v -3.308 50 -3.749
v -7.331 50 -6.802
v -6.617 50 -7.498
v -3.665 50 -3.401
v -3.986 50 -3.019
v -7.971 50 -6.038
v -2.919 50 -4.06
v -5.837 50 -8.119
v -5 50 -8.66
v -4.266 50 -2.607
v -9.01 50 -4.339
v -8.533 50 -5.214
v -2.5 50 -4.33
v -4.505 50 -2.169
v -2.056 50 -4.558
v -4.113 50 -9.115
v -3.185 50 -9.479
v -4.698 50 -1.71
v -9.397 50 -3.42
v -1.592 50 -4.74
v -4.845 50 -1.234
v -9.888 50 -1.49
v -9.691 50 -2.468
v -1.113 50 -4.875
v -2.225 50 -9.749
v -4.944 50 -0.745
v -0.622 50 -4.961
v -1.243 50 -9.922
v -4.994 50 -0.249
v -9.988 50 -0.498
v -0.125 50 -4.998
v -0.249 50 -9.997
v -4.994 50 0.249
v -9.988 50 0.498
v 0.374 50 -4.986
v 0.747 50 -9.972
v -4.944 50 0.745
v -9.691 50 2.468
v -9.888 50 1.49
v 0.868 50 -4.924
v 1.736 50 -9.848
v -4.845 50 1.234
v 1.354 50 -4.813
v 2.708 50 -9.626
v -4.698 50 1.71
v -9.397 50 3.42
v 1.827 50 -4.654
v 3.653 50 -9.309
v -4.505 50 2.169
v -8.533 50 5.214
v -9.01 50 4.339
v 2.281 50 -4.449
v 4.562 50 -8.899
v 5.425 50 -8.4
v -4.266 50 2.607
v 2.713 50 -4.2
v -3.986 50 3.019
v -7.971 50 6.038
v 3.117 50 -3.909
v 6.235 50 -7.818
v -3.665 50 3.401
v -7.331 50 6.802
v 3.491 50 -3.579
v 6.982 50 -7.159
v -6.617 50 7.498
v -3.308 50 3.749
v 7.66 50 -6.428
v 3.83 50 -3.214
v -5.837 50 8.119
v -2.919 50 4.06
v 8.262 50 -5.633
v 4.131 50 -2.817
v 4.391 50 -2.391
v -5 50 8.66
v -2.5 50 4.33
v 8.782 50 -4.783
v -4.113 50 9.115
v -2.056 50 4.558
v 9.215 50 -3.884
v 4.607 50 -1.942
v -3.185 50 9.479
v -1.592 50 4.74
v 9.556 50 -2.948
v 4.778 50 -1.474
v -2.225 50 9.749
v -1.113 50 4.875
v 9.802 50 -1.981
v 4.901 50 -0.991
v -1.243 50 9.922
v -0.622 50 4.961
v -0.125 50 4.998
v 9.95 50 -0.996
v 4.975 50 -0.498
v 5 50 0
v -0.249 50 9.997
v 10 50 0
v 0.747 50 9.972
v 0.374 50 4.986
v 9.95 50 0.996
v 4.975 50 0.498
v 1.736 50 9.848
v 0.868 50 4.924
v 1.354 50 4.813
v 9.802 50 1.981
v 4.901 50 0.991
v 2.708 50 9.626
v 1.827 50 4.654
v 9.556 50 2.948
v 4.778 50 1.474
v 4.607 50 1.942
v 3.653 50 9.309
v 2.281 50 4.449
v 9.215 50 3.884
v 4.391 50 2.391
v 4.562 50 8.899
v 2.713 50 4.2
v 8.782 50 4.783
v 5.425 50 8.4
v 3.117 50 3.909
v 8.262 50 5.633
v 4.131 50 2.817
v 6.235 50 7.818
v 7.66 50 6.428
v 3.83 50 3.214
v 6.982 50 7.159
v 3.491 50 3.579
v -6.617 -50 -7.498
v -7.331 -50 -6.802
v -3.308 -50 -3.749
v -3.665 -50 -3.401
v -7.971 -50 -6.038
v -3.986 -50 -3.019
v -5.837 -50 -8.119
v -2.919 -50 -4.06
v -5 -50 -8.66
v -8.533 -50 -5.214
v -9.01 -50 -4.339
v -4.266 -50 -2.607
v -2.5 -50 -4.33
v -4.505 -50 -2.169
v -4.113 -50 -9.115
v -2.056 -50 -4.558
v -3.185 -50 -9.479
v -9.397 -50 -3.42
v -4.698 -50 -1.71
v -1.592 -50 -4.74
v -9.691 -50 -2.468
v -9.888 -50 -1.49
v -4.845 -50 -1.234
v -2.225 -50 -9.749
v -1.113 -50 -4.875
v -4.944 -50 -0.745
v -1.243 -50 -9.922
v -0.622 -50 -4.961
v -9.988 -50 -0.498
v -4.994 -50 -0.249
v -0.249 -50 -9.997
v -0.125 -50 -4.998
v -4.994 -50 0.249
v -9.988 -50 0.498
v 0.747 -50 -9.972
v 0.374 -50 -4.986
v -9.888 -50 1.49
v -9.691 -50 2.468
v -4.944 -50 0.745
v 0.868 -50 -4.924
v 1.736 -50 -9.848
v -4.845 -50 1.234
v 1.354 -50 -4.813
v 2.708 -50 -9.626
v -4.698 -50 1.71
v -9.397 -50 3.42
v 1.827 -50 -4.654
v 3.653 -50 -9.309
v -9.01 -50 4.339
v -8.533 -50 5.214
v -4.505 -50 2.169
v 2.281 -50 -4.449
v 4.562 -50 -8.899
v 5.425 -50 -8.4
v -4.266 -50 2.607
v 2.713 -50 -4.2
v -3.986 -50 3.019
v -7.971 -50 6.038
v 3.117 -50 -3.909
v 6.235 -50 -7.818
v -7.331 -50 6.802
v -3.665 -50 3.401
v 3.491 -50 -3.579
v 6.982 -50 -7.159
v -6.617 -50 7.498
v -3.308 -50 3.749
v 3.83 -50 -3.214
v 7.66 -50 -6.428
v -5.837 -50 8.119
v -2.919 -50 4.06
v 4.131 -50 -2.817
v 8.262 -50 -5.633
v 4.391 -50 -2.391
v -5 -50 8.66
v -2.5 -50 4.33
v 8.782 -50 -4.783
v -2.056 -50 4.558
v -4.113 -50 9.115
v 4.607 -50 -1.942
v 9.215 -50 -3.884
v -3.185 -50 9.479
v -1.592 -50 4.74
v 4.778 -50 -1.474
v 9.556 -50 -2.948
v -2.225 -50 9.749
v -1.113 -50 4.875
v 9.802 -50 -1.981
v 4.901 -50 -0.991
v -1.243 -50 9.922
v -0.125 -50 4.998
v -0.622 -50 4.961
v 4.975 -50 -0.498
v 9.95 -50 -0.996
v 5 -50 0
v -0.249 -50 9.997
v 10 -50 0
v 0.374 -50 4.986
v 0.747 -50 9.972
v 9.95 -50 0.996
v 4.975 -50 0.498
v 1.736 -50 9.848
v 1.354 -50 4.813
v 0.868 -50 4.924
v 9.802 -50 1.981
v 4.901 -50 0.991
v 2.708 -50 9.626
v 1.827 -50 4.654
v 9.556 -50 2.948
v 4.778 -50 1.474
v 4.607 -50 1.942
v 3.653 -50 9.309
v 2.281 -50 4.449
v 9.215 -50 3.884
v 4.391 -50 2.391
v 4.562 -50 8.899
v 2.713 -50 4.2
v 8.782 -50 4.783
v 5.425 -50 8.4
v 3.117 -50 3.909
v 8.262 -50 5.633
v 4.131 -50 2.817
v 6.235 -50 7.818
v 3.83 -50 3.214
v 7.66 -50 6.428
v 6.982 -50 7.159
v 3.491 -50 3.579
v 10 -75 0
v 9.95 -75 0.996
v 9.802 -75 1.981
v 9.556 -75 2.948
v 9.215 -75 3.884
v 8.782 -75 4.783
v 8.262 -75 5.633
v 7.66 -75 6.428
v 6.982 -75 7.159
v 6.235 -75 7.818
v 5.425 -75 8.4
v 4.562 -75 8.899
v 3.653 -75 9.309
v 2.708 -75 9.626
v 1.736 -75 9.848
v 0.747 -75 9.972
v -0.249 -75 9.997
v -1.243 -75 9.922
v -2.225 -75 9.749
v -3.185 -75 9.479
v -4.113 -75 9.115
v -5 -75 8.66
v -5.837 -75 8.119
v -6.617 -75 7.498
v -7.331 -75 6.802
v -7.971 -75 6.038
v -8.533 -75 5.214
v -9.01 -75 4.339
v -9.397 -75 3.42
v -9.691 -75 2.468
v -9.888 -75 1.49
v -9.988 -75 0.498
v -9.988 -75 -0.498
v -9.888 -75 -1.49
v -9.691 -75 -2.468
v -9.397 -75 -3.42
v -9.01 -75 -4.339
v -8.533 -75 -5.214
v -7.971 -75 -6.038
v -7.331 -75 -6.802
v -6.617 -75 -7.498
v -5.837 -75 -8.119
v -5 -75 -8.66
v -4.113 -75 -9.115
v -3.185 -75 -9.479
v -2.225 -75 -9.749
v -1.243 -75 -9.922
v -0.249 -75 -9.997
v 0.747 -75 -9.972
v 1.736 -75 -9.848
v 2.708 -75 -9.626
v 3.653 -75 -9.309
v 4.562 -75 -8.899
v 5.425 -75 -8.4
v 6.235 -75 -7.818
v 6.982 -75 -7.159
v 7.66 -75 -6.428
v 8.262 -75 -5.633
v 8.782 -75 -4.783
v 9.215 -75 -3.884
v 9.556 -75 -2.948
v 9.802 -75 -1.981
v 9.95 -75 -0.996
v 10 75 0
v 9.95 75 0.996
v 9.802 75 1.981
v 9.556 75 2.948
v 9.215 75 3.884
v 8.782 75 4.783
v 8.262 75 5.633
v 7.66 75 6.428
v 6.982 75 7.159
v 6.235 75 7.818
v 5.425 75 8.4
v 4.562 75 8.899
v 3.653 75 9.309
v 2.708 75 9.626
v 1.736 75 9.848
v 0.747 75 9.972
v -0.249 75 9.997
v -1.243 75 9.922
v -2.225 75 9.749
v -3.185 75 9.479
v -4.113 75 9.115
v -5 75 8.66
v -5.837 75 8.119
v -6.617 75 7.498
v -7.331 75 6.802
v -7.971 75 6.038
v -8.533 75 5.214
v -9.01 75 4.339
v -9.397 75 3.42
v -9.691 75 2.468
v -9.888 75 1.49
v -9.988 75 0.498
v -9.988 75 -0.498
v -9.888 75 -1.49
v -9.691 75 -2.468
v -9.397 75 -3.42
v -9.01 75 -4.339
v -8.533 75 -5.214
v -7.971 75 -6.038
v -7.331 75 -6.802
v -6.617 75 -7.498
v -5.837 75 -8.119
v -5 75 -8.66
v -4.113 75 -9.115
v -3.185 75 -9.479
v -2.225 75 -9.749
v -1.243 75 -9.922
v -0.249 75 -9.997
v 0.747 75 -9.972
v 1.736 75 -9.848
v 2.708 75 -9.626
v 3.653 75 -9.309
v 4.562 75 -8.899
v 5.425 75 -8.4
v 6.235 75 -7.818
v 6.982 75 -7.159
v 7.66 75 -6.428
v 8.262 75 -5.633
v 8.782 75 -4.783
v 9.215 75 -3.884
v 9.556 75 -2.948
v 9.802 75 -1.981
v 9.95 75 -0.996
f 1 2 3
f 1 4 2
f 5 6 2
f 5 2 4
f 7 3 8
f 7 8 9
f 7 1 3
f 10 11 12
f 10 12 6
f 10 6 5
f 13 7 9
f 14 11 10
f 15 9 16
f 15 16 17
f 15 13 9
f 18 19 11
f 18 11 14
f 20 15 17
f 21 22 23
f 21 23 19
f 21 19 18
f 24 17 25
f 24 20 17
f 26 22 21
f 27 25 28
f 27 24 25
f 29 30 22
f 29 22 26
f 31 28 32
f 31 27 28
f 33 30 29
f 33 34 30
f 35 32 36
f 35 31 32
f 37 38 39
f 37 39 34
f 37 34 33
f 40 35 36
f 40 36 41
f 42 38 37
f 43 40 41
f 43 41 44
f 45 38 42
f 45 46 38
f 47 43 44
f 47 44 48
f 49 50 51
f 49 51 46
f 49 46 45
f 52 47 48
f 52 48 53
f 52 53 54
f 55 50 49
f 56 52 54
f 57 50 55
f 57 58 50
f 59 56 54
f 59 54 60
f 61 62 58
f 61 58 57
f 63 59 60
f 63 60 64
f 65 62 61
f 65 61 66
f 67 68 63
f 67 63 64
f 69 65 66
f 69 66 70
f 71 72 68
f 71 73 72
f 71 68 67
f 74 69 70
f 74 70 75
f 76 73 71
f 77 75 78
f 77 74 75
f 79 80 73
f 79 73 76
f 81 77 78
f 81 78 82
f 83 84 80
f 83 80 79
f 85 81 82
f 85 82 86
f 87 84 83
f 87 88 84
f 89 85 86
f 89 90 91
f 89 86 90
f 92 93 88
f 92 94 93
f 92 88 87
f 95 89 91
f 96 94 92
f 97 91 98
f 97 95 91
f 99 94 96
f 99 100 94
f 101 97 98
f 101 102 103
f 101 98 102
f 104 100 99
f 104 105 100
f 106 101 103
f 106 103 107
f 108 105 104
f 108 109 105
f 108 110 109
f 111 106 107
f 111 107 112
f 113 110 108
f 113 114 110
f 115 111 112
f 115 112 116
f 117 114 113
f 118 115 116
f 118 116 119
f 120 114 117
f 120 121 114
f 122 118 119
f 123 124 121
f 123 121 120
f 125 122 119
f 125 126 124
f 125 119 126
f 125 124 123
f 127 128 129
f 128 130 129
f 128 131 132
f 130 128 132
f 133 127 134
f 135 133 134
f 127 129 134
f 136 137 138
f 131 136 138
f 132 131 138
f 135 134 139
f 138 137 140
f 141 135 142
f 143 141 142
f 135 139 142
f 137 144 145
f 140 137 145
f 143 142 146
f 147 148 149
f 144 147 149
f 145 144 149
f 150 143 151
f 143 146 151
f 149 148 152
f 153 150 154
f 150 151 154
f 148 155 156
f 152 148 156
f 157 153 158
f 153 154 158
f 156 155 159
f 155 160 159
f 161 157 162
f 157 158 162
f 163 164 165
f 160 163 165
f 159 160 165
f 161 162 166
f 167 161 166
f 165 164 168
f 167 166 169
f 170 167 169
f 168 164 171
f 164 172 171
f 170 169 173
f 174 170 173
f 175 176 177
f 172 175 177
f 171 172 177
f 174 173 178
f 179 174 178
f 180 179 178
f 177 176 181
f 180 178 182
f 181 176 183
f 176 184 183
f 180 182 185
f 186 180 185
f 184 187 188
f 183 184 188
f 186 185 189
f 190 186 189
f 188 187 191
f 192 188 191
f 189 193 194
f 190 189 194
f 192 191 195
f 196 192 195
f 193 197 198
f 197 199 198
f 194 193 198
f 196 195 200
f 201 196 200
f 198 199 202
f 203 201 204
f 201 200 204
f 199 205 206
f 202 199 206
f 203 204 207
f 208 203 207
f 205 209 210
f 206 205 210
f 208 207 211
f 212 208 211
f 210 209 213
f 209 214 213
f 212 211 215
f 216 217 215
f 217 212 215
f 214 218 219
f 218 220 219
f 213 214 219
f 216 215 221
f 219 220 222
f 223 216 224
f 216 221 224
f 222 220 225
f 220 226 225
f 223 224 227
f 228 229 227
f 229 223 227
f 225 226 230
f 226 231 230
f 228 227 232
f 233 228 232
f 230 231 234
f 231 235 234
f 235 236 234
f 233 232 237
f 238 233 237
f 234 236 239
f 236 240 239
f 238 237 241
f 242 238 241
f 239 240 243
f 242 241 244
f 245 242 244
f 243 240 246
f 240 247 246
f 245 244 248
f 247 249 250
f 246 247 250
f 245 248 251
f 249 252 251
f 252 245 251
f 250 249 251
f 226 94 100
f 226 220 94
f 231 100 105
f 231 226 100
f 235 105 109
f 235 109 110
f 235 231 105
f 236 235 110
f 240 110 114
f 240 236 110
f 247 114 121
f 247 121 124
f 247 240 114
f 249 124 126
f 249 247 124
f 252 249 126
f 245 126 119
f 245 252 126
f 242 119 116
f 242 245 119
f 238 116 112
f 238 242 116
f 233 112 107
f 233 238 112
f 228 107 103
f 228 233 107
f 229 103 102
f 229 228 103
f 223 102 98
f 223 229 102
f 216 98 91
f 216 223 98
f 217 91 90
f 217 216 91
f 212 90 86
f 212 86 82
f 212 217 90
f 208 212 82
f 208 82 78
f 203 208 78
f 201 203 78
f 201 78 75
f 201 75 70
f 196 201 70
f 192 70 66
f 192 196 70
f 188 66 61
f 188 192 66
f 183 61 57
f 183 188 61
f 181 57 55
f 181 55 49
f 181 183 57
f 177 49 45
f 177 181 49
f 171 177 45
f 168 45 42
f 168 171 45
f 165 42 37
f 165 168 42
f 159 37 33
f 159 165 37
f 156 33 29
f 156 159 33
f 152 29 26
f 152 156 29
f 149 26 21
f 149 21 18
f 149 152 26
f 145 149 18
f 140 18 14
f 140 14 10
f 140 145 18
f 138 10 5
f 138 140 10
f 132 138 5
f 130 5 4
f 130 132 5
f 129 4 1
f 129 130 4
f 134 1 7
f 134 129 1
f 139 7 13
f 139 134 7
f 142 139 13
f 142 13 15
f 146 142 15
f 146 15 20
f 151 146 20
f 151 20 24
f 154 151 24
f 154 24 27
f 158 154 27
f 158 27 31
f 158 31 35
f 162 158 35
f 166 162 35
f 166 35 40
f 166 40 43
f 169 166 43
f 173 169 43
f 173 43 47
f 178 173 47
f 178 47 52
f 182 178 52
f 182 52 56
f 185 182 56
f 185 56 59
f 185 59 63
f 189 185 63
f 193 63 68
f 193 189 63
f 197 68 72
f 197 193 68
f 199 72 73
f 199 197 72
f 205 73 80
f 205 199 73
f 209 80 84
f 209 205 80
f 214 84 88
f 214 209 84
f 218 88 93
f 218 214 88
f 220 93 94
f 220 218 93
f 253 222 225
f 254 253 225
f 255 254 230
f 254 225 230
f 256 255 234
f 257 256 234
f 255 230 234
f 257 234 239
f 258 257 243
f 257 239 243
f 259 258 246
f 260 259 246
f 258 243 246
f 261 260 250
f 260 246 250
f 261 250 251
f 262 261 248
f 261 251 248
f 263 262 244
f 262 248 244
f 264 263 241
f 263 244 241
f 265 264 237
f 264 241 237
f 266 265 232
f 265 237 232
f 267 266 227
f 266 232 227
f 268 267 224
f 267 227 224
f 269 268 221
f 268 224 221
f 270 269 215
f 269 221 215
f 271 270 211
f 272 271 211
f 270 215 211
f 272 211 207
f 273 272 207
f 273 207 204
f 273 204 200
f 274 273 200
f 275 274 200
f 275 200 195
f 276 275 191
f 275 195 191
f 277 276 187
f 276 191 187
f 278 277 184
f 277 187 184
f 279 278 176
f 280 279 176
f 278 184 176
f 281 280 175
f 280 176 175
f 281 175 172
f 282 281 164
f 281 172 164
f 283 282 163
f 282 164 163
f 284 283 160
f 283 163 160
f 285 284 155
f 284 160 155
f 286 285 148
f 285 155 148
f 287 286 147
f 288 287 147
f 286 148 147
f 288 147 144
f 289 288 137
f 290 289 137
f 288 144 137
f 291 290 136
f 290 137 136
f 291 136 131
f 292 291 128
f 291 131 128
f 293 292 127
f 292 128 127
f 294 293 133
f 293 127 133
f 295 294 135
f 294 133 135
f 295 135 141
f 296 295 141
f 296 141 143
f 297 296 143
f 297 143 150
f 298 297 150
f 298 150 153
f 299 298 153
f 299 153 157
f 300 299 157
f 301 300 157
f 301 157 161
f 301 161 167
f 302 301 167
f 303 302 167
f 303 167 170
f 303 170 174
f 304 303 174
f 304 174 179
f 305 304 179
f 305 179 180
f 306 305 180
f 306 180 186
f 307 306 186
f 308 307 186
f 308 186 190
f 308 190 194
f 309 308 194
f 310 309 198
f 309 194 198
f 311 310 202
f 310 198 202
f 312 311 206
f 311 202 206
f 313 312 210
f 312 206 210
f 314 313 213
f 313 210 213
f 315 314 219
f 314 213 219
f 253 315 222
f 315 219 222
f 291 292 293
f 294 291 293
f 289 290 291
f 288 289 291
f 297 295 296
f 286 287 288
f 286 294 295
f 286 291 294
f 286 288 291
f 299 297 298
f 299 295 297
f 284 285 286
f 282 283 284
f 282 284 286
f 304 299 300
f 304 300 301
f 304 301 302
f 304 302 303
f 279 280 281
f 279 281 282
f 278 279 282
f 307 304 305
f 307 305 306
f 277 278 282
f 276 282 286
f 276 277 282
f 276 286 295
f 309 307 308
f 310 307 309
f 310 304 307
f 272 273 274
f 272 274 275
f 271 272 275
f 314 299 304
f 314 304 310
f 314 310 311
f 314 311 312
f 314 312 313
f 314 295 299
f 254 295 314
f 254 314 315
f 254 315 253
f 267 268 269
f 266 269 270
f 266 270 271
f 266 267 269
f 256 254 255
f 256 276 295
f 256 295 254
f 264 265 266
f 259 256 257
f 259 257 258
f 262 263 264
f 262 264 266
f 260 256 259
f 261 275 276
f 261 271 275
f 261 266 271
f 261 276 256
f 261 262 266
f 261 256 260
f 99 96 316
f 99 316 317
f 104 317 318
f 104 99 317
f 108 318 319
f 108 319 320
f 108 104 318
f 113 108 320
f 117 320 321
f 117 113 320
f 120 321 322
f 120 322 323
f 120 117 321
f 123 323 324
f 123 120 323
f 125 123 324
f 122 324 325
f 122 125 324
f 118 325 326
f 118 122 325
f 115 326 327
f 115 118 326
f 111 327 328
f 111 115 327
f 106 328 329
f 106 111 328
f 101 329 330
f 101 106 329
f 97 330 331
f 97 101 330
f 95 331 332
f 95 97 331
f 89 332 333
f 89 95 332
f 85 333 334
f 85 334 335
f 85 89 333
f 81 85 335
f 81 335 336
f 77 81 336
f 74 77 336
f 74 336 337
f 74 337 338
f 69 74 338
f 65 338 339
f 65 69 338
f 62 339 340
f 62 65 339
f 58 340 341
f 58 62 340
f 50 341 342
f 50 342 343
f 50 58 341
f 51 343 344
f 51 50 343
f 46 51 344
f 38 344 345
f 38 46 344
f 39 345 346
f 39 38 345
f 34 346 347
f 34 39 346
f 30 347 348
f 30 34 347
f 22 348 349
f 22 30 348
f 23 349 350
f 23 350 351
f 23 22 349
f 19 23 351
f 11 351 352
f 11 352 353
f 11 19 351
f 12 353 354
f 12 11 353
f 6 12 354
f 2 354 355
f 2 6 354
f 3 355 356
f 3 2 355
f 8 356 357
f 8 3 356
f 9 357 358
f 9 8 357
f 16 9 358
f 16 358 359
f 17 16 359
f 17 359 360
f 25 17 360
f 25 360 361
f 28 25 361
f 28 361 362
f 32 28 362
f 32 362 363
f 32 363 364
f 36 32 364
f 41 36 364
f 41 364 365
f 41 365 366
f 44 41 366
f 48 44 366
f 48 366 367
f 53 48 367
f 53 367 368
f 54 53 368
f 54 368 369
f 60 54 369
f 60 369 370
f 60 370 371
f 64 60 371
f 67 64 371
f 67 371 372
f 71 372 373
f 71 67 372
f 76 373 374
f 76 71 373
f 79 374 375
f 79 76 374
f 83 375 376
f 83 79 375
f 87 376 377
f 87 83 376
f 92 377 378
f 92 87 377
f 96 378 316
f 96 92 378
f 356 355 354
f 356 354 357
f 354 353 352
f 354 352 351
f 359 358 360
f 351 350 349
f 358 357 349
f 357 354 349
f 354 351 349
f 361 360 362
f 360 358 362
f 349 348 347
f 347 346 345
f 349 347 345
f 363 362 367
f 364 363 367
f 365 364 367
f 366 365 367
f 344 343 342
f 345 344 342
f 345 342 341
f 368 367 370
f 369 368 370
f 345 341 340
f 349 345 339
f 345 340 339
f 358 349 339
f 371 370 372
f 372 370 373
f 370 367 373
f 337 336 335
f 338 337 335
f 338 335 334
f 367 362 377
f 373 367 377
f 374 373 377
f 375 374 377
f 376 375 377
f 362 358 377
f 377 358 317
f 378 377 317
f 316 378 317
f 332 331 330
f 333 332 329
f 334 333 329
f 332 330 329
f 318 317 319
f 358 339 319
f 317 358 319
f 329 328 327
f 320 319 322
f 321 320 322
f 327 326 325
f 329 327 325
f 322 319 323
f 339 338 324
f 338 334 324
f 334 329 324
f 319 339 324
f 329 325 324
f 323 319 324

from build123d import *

# Parameters (mm, degrees)
F0_R          = 5
F1_DEPTH      = 50
F1_DEPTH_BACK = 50
F2_R          = 10
F3_DEPTH      = 25


# Not quite as in the source:
# - a pattern or mirror of a feature is missing from the dataset's text; its kind, count and spacing are read off the source's solid


with BuildPart() as f1:
    # F0 (on Front) → F1 (new body, two sides)
    with BuildSketch(Plane.XZ) as f1_sk:
        Circle(F0_R)
    extrude(amount=F1_DEPTH)
    extrude(f1_sk.sketch, amount=-F1_DEPTH_BACK)

    # F2 (on face) → F3 (join)
    with BuildSketch(Plane.XZ.offset(50)):
        Circle(F2_R)
    f3 = extrude(amount=F3_DEPTH)

    # F3_copies: F3 across plane
    add(f3.mirror(Plane.ZX))


solid = f1.part
